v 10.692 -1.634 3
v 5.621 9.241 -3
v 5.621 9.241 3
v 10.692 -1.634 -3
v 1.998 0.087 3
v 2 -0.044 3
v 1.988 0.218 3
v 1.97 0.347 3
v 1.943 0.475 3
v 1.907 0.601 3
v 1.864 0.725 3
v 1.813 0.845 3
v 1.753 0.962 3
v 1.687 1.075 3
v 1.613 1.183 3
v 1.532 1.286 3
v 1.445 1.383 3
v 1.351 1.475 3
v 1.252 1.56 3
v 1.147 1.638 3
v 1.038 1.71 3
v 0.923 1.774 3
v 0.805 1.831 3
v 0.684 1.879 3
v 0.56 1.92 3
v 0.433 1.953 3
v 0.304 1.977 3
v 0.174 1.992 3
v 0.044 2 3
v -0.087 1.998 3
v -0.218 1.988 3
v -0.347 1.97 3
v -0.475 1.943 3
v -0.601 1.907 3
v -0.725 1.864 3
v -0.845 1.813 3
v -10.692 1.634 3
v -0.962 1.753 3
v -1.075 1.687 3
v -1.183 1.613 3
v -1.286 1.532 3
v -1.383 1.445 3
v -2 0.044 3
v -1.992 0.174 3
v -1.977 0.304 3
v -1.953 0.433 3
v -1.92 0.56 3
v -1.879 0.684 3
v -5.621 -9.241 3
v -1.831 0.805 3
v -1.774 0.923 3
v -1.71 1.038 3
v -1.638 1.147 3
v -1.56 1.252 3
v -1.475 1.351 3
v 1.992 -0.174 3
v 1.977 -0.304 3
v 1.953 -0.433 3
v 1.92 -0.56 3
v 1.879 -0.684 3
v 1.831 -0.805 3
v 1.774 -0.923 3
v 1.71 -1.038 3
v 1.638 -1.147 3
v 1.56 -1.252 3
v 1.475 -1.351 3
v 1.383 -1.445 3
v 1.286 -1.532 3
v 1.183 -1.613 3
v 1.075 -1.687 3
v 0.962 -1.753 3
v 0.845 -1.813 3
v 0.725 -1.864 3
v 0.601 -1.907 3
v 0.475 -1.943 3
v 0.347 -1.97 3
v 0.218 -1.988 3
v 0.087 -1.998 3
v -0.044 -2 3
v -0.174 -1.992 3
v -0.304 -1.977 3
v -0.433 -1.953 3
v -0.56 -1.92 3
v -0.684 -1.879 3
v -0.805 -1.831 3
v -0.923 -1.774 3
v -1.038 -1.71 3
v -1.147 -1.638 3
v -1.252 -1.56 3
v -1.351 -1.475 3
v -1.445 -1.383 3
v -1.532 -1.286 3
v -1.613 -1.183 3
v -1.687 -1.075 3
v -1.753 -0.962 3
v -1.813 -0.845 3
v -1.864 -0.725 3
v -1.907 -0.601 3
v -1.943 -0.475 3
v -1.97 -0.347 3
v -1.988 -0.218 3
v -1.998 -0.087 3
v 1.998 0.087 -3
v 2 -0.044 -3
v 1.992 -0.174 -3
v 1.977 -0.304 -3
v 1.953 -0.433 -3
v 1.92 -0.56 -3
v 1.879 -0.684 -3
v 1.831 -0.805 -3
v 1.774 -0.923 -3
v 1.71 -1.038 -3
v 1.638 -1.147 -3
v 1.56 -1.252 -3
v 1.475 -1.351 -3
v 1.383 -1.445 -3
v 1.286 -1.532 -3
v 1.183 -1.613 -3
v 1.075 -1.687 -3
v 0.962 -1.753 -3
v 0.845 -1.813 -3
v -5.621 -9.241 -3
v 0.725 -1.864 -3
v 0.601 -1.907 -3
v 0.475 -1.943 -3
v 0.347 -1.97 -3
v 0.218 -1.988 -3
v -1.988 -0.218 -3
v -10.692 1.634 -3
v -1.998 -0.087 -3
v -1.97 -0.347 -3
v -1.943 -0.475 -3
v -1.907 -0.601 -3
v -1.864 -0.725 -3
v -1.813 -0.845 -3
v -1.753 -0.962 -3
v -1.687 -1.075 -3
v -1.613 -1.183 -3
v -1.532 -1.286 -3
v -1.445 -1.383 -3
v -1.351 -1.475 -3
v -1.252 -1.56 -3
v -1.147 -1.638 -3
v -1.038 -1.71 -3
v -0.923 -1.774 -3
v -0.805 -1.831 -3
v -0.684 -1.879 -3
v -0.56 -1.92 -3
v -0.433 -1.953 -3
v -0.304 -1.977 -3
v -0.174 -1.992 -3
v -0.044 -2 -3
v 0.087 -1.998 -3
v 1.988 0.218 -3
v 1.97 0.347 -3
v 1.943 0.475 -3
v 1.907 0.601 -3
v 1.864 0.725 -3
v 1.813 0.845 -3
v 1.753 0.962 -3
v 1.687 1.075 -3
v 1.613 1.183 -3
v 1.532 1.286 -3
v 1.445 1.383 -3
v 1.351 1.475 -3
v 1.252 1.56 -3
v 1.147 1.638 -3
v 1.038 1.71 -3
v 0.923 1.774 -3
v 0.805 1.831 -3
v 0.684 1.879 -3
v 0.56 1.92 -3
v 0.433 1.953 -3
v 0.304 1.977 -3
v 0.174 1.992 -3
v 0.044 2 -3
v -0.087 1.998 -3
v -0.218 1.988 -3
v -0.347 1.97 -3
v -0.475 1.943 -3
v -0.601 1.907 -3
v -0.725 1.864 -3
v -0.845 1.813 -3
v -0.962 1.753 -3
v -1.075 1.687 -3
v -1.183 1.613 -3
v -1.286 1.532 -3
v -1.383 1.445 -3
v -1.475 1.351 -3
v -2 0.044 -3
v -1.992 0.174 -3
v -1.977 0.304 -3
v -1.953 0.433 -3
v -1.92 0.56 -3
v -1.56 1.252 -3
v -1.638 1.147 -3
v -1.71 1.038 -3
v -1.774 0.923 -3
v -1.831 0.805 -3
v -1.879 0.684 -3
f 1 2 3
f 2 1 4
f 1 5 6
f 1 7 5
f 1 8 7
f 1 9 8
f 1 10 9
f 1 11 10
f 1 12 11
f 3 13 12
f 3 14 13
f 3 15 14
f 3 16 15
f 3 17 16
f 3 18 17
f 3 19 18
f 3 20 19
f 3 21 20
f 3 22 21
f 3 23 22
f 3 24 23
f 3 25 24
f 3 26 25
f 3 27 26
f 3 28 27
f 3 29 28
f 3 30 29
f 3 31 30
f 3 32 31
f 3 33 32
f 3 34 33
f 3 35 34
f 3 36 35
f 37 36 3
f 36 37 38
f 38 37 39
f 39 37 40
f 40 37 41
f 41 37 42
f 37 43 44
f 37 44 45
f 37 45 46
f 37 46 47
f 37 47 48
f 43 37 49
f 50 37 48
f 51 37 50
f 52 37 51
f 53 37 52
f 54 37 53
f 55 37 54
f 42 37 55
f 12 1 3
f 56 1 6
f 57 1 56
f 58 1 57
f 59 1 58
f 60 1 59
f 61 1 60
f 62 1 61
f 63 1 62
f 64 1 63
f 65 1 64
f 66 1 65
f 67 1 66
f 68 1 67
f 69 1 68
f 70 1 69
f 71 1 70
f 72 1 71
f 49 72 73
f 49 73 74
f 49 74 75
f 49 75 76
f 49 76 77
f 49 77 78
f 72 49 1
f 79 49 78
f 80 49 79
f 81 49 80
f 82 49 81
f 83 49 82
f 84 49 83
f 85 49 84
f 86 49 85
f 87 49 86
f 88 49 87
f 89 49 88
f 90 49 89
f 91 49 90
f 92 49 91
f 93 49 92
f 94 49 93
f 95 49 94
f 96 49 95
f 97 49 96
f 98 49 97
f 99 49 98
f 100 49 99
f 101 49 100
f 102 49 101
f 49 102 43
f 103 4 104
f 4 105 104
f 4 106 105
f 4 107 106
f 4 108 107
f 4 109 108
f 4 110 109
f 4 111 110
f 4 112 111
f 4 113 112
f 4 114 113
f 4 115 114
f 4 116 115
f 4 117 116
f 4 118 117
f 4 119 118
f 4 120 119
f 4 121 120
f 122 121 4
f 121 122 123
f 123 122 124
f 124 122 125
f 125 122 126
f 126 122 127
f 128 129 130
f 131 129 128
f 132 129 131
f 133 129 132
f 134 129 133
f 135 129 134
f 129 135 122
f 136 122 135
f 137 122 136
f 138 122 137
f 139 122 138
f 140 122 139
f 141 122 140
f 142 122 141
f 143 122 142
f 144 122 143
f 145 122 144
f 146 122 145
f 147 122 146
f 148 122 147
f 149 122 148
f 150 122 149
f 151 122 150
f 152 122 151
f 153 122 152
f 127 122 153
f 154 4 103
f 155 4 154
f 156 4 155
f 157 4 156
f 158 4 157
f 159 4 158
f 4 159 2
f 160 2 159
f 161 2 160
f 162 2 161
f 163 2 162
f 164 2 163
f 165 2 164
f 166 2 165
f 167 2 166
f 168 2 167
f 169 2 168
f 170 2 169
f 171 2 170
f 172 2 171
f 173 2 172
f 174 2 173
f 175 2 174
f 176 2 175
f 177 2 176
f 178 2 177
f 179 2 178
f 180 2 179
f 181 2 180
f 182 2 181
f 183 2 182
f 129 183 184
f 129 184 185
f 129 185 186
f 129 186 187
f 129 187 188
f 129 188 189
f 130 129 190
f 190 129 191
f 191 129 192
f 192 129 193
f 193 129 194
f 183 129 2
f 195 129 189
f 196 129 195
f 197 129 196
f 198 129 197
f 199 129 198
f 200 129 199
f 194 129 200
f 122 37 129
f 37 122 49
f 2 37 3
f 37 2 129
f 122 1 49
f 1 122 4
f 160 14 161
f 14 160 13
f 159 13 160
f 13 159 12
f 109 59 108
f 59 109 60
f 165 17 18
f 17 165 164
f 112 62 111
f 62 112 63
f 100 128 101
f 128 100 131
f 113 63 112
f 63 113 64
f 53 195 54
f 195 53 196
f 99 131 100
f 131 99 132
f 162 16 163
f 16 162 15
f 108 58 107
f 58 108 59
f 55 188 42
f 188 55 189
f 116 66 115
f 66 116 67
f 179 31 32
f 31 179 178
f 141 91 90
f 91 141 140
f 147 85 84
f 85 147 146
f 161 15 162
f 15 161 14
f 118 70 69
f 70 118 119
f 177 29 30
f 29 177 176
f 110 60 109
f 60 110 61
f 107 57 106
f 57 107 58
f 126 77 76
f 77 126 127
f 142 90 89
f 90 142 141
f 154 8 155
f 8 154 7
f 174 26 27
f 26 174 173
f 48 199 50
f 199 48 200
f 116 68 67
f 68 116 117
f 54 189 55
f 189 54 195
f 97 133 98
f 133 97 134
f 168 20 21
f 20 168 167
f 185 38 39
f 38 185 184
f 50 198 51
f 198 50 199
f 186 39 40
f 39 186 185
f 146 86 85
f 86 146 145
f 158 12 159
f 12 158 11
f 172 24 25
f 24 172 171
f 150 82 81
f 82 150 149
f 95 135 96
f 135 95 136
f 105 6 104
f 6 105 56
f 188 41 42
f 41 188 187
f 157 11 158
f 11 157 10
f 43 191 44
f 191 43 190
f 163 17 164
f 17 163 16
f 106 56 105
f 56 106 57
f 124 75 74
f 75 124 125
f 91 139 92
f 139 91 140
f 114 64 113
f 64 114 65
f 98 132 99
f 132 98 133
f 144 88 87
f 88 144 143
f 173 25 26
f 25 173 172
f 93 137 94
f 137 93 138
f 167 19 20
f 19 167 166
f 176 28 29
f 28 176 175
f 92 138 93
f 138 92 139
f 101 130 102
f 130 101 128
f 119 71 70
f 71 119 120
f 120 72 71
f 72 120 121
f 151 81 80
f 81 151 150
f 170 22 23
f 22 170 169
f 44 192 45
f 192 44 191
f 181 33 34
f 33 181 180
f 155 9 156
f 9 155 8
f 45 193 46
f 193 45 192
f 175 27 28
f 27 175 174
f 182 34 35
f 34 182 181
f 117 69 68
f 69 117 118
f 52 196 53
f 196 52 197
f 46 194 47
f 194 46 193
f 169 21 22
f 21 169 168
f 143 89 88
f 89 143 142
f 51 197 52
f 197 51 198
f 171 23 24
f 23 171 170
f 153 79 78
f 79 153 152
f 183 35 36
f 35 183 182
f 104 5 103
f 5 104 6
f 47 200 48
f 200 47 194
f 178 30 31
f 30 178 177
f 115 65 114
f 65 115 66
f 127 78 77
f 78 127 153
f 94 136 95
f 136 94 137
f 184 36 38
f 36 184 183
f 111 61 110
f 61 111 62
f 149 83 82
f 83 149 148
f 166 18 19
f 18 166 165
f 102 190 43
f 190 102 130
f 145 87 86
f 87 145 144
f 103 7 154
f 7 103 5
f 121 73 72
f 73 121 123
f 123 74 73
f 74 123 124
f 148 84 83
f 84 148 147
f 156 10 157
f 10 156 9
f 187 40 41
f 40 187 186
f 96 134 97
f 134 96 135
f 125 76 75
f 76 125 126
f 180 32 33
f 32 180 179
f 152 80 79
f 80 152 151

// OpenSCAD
// Auto-generated from tests/data/feature_fixtures_manifest.json
// fixture: box_rotated_z25_with_hole
// fixture_type: box
// description: Rotated box (Z25 deg) with a single through-hole on the smallest face. Validates rotated-box local-frame hole detection.
// transform: rotate=[0.000000, 0.000000, 25.000000], translate=[0.000000, 0.000000, 0.000000]
$fn = 96;

box_size = [18.000000, 12.000000, 6.000000];
box_origin = [-9.000000, -6.000000, -3.000000];

module through_hole_x(center, diameter, length) {
  translate([box_origin[0] - 0.1, center[1], center[2]])
    rotate(a=90, v=[0, 1, 0]) cylinder(d=diameter, h=length, center=false);
}

module through_hole_y(center, diameter, length) {
  translate([center[0], box_origin[1] - 0.1, center[2]])
    rotate(a=90, v=[-1, 0, 0]) cylinder(d=diameter, h=length, center=false);
}

module through_hole_z(center, diameter, length) {
  translate([center[0], center[1], box_origin[2] - 0.1])
    cylinder(d=diameter, h=length, center=false);
}

translate([0.000000, 0.000000, 0.000000])
rotate([0.000000, 0.000000, 25.000000]) {
difference() {
  translate(box_origin) cube(box_size);
  through_hole_z([0.000000, 0.000000, 0.000000], 4.000000, 6.200000);  // hole_0
}
}
